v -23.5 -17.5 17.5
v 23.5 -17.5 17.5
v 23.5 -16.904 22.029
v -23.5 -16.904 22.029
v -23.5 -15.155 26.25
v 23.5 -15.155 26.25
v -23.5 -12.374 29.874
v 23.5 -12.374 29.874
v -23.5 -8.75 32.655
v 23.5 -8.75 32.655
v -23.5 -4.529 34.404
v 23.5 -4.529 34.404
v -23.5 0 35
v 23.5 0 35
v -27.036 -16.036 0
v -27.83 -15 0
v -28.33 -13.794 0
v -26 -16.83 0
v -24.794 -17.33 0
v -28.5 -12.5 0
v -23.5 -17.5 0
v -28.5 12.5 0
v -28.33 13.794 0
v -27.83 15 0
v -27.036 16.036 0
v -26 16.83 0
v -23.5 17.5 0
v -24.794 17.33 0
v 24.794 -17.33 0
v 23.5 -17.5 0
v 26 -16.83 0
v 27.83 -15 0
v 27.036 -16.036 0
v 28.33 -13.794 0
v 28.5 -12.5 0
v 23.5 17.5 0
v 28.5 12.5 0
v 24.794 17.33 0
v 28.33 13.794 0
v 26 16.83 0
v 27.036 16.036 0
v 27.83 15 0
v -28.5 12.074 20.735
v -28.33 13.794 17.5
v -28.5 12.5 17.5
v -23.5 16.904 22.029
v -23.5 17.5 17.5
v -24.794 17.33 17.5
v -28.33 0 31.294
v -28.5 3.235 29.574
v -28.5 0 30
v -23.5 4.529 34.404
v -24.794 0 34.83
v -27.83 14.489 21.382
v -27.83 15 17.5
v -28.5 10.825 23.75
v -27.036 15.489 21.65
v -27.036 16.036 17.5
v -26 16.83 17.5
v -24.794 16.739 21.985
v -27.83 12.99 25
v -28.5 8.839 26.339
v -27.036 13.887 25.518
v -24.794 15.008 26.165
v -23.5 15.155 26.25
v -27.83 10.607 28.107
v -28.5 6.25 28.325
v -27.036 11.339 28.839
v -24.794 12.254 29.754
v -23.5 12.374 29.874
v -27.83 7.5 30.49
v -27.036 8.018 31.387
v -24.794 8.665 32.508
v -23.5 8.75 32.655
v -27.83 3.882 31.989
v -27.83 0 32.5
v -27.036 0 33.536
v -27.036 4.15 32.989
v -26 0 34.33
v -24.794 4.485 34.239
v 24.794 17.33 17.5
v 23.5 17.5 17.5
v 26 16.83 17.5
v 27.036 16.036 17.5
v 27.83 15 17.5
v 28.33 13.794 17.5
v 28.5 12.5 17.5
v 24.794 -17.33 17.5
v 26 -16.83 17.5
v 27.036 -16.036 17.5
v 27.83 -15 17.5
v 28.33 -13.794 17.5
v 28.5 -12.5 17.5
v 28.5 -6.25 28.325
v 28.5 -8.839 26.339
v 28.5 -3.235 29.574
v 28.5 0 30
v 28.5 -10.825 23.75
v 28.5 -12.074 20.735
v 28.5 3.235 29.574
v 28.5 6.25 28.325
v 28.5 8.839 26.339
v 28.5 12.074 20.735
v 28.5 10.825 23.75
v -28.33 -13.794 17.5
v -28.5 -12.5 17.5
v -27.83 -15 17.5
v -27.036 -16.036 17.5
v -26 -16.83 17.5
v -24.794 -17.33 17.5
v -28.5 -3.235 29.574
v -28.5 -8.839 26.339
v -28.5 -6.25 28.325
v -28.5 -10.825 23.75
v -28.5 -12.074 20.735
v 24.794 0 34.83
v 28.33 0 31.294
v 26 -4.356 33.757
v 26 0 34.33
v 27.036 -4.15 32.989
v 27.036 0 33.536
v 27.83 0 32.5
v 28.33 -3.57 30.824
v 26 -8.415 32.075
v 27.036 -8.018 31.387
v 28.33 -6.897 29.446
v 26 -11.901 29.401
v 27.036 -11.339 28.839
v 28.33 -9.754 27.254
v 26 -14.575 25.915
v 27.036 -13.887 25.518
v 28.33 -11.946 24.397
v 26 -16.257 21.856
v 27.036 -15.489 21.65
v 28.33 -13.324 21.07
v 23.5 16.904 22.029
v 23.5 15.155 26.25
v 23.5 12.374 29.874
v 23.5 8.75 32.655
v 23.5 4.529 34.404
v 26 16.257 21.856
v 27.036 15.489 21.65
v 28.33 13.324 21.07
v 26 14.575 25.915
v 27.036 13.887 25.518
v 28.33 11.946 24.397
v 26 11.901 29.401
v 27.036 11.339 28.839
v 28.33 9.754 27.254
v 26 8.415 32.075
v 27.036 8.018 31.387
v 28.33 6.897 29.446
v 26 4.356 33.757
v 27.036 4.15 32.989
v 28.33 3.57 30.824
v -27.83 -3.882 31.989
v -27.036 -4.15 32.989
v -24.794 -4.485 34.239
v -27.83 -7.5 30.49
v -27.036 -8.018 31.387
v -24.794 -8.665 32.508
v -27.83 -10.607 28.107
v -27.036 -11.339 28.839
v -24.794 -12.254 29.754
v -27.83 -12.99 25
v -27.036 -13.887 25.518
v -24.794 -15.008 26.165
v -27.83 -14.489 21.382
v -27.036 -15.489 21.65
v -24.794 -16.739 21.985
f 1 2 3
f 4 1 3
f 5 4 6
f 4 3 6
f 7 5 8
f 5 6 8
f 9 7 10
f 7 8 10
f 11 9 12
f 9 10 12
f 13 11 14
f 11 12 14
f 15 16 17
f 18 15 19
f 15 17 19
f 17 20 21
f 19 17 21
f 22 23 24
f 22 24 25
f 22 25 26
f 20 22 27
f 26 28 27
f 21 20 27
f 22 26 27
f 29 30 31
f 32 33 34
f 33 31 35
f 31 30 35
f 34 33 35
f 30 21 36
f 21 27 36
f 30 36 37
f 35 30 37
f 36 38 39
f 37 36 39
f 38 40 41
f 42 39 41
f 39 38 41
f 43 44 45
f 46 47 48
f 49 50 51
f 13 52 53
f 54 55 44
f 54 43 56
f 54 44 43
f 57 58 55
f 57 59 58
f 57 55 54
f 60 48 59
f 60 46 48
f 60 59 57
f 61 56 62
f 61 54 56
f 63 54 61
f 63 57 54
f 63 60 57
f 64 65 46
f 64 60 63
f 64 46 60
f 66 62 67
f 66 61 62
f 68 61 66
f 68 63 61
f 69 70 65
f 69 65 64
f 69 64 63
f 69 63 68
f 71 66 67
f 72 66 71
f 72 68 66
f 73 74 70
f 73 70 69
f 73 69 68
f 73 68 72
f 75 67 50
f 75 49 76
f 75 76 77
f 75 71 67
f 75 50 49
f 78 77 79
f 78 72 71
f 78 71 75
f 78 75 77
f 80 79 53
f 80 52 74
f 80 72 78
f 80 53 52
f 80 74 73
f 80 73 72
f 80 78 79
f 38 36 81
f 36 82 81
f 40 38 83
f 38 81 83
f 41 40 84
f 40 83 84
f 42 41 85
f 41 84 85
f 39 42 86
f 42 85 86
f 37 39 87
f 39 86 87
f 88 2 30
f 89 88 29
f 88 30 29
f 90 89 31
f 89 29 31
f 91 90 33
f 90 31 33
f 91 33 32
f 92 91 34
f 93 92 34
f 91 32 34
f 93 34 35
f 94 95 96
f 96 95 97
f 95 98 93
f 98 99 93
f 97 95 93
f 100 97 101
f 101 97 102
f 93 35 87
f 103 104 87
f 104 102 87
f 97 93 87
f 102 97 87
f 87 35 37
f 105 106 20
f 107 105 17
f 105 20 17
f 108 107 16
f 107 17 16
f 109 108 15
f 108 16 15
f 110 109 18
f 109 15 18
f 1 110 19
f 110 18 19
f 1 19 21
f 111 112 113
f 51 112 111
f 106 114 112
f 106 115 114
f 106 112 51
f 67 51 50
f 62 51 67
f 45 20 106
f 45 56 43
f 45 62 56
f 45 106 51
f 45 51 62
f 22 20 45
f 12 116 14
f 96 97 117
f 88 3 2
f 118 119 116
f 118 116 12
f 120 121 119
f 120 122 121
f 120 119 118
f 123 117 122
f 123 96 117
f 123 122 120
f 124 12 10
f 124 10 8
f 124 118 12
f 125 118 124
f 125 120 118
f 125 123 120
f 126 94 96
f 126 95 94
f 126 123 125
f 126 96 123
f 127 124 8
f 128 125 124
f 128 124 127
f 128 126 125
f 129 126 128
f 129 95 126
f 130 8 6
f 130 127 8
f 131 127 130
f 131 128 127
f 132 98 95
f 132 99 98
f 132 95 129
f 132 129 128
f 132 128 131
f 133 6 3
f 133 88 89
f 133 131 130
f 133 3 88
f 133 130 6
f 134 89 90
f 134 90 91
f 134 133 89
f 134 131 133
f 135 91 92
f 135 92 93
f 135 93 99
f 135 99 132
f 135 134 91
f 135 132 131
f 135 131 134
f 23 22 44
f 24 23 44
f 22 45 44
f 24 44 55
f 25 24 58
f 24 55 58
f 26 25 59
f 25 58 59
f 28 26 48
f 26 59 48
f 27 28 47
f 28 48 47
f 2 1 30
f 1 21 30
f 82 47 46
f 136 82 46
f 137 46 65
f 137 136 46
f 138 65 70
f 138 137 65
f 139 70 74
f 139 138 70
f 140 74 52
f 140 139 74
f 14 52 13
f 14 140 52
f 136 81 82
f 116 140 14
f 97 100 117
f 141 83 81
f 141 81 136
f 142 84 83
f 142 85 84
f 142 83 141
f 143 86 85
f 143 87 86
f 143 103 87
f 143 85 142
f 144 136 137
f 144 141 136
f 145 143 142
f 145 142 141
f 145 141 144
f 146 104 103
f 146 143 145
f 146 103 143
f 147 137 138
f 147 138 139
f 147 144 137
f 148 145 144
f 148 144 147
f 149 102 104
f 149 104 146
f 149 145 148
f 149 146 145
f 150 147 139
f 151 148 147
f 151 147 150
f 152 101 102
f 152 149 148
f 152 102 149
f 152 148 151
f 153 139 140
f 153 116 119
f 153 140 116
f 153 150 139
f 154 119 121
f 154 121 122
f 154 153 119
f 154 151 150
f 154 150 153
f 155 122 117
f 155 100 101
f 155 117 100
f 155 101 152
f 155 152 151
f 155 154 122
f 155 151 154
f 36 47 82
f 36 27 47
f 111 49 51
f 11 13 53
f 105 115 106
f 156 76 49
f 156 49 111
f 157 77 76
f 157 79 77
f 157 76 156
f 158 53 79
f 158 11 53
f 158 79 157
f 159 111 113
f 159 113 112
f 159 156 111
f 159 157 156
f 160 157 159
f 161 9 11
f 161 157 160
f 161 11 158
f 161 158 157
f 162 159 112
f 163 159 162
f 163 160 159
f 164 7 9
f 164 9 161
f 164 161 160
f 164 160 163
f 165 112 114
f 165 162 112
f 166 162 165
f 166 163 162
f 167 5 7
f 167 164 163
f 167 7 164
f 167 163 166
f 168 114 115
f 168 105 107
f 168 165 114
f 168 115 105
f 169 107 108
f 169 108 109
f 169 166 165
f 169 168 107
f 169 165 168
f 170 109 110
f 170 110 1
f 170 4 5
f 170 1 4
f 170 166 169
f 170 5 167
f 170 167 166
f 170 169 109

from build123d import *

# Parameters (mm, degrees)
F0_W     = 57
F0_H     = 35
F1_DEPTH = 35
F2_R     = 17.49999
F3_R     = 5


# Not quite as in the source:
# - a fillet or chamfer is up to 0.001 mm smaller than in the source, because OpenCascade refuses the exact size


with BuildPart() as f1:
    # F0 (on Top) → F1 (new body)
    with BuildSketch(Plane.XY):
        Rectangle(F0_W, F0_H)
    extrude(amount=F1_DEPTH)

    # F2 (radius 17.5 in the source; OpenCascade refuses exactly that, so slightly less here)
    f2_edges = [f1.edges().sort_by_distance(p)[0] for p in [
        (0, -17.5, 35),
        (0, 17.5, 35),
    ]]
    fillet(f2_edges, radius=F2_R)

    # F3
    f3_edges = [f1.edges().sort_by_distance(p)[0] for p in [
        (28.5, 17.5, 8.750005),
        (28.5, 12.374372, 29.874372),
        (28.5, -17.5, 8.750005),
        (-28.5, 12.374372, 29.874372),
        (-28.5, -17.5, 8.750005),
        (-28.5, 17.5, 8.750005),
    ]]
    fillet(f3_edges, radius=F3_R)


solid = f1.part
